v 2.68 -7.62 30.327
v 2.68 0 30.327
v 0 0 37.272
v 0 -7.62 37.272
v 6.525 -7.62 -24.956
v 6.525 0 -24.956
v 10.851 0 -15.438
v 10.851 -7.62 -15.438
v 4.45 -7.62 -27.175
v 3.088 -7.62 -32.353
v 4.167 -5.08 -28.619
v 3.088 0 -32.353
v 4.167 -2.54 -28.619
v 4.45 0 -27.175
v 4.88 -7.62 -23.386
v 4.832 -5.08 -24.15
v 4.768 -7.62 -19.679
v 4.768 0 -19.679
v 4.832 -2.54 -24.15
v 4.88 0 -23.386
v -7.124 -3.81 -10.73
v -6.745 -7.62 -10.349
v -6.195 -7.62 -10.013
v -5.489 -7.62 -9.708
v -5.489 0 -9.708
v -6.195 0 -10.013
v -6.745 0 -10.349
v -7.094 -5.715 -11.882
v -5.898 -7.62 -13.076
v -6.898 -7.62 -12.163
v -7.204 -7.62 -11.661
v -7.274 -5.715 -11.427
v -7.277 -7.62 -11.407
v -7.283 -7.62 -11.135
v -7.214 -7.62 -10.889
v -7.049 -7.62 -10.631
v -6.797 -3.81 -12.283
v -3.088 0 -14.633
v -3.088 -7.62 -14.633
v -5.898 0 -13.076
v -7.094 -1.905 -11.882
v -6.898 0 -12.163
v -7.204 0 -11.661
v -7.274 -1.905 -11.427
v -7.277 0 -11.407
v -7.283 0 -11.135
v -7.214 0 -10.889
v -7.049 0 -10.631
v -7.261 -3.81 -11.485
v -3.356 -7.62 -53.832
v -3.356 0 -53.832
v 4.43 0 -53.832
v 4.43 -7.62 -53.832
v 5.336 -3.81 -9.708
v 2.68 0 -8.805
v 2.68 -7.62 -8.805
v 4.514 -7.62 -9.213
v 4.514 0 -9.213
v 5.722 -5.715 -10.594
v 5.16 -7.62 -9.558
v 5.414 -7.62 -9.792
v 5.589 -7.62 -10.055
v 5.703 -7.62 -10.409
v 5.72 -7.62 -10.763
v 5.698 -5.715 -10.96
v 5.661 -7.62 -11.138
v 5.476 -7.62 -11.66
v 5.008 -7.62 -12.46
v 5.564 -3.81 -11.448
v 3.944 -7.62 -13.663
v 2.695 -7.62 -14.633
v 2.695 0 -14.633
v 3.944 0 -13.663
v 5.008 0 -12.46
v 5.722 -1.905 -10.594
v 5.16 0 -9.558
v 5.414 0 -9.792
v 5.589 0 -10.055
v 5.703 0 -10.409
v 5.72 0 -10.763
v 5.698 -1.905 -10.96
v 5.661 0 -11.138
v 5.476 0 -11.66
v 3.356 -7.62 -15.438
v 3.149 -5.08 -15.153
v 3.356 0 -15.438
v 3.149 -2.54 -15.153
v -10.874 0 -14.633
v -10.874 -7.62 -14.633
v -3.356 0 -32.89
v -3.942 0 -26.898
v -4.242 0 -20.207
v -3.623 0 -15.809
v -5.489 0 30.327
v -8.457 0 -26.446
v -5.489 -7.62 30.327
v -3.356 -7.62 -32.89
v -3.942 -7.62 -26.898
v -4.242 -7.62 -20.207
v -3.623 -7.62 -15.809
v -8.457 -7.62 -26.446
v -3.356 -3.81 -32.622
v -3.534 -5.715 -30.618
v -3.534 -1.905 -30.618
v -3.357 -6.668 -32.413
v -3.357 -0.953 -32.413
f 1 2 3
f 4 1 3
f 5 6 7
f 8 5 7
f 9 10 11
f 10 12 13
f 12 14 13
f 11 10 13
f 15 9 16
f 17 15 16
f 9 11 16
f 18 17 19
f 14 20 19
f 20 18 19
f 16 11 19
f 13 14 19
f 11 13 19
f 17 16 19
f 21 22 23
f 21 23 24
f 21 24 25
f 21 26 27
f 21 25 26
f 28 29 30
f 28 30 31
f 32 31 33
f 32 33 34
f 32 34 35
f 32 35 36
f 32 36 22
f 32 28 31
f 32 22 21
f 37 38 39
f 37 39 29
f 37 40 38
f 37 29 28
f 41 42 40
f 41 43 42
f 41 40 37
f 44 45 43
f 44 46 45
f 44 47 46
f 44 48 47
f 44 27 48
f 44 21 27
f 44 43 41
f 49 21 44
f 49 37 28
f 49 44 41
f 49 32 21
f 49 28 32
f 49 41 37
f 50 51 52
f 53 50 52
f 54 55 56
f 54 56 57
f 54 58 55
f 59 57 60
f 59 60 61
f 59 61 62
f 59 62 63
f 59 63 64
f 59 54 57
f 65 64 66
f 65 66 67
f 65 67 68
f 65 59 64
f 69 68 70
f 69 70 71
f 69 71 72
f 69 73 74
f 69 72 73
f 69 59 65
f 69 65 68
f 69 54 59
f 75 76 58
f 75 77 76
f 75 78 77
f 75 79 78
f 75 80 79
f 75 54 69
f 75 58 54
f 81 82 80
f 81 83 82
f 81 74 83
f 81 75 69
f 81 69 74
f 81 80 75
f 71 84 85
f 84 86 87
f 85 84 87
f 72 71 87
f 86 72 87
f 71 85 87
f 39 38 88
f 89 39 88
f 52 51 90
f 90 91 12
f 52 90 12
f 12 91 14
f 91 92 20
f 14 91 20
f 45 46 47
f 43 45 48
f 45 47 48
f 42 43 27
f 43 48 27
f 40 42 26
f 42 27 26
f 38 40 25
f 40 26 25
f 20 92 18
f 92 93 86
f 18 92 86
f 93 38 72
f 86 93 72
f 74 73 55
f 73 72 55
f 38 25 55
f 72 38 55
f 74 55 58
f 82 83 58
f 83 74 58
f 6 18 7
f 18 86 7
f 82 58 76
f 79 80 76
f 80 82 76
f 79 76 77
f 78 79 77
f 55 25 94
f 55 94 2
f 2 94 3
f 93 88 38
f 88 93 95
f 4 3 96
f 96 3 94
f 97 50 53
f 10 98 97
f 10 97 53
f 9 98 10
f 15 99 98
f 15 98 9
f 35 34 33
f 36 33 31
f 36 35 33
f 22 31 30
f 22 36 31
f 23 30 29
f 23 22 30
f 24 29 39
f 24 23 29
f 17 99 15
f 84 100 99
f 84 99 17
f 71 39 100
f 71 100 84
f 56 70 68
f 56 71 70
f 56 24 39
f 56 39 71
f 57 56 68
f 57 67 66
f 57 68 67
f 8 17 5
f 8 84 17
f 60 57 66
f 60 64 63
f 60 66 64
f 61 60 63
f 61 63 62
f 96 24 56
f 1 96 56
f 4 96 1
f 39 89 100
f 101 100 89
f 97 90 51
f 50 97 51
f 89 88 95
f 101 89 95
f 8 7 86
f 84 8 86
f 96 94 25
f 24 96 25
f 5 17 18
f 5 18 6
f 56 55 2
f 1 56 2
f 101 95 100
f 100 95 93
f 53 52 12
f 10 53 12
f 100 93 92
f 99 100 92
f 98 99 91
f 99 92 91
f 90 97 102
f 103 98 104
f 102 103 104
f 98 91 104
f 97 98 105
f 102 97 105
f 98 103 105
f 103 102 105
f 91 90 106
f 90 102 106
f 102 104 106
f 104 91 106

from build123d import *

# Parameters (mm, degrees)
F1_DEPTH = 7.62


with BuildPart() as f1:
    # F0 (on Front) → F1 (new body)
    with BuildSketch(Plane.XZ):
        with BuildLine():
            add(Edge.make_bspline(
                [(-3.6225296477, -15.809470365), (-5.221652466, -20.6566191195), (-3.0213163838, -32.7604657838), (-3.4122510352, -32.7973512532), (-3.3561242744, -32.8900180757)],
                knots=[0.0229994551, 0.0229994551, 0.0229994551, 0.0229994551, 0.2732662158, 0.3066490858, 0.3066490858, 0.3066490858, 0.3066490858], degree=3))
            add(Edge.make_bspline(
                [(-3.3561242744, -32.8900180757), (-3.1358457295, -33.2537039993), (0.4806107603, -36.7303956157), (2.2628287437, -34.532456504), (3.0876353849, -32.3530361056)],
                knots=[0.3066490858, 0.3066490858, 0.3066490858, 0.3066490858, 0.4376655552, 0.570837215, 0.570837215, 0.570837215, 0.570837215], degree=3))
            add(Edge.make_bspline(
                [(3.0876353849, -32.3530361056), (4.2694508133, -29.2302767542), (5.3002211715, -23.9077265842), (4.7680724157, -19.67944375)],
                knots=[0.570837215, 0.570837215, 0.570837215, 0.570837215, 0.7616508122, 0.7616508122, 0.7616508122, 0.7616508122], degree=3))
            Line((4.7680724157, -19.67944375), (3.3561252058, -15.4381711036))
            add(Edge.make_bspline(
                [(3.3561252058, -15.4381711036), (3.1559817041, -15.1441789227), (2.9338306018, -14.8749349929), (2.6951951163, -14.6327009425)],
                knots=[0.8358226137, 0.8358226137, 0.8358226137, 0.8358226137, 0.8553020379, 0.8553020379, 0.8553020379, 0.8553020379], degree=3))
            add(Edge.make_bspline(
                [(2.6951951163, -14.6327009425), (0.8124363798, -15.8162346158), (-0.8659672448, -15.5991068238), (-3.0876344535, -14.6327009425)],
                knots=[0.774708827, 0.774708827, 0.774708827, 0.774708827, 1, 1, 1, 1], degree=3))
            Line((-3.0876344535, -14.6327009425), (-3.6225296477, -15.809470365))
        make_face()
        with BuildLine():
            add(Edge.make_bspline(
                [(-3.3561242744, -32.8900180757), (-3.1358457295, -33.2537039993), (0.4806107603, -36.7303956157), (2.2628287437, -34.532456504), (3.0876353849, -32.3530361056)],
                knots=[0.3066490858, 0.3066490858, 0.3066490858, 0.3066490858, 0.4376655552, 0.570837215, 0.570837215, 0.570837215, 0.570837215], degree=3))
            Line((-3.3561242744, -32.8900180757), (-3.3561242744, -53.8322329521))
            Line((-3.3561242744, -53.8322329521), (4.4300844893, -53.8322329521))
            Line((4.4300844893, -53.8322329521), (3.0876353849, -32.3530361056))
        make_face()
        with BuildLine():
            Line((-8.4574334323, -26.4462586492), (-3.6225296477, -15.809470365))
            add(Edge.make_bspline(
                [(-3.0876344535, -14.6327009425), (-3.2987101155, -14.9678229002), (-3.4755706454, -15.3640185604), (-3.6225296477, -15.809470365)],
                knots=[0, 0, 0, 0, 0.0229994551, 0.0229994551, 0.0229994551, 0.0229994551], degree=3))
            Line((-3.0876344535, -14.6327009425), (-10.8738420531, -14.6327009425))
            Line((-10.8738420531, -14.6327009425), (-8.4574334323, -26.4462586492))
        make_face()
        with BuildLine():
            add(Edge.make_bspline(
                [(-3.0876344535, -14.6327009425), (-3.2987101155, -14.9678229002), (-3.4755706454, -15.3640185604), (-3.6225296477, -15.809470365)],
                knots=[0, 0, 0, 0, 0.0229994551, 0.0229994551, 0.0229994551, 0.0229994551], degree=3))
            Line((-3.6225296477, -15.809470365), (-3.0876344535, -14.6327009425))
        make_face()
        with BuildLine():
            Line((3.3561252058, -15.4381711036), (4.7680724157, -19.67944375))
            add(Edge.make_bspline(
                [(4.7680724157, -19.67944375), (4.5612190651, -18.0358535661), (4.1182115982, -16.5576051031), (3.3561252058, -15.4381711036)],
                knots=[0.7616508122, 0.7616508122, 0.7616508122, 0.7616508122, 0.8358226137, 0.8358226137, 0.8358226137, 0.8358226137], degree=3))
        make_face()
        with BuildLine():
            add(Edge.make_bspline(
                [(4.7680724157, -19.67944375), (4.5612190651, -18.0358535661), (4.1182115982, -16.5576051031), (3.3561252058, -15.4381711036)],
                knots=[0.7616508122, 0.7616508122, 0.7616508122, 0.7616508122, 0.8358226137, 0.8358226137, 0.8358226137, 0.8358226137], degree=3))
            Line((4.7680724157, -19.67944375), (6.5245554865, -24.9556492271))
            Line((6.5245554865, -24.9556492271), (10.8506819233, -15.4381711036))
            Line((10.8506819233, -15.4381711036), (3.3561252058, -15.4381711036))
        make_face()
        with BuildLine():
            add(Edge.make_bspline(
                [(-3.0876344535, -14.6327009425), (-5.2768470806, -13.6804125214), (-8.8119414144, -11.4945501592), (-6.2753688181, -10.0010317936), (-5.4893235481, -9.7083225846)],
                knots=[0, 0, 0, 0, 0.2220000722, 0.288874532, 0.288874532, 0.288874532, 0.288874532], degree=3))
            add(Edge.make_bspline(
                [(2.6951951163, -14.6327009425), (0.9225519342, -12.8333267335), (-1.7596804655, -12.5243264561), (-3.0876344535, -14.6327009425)],
                knots=[0.8553020379, 0.8553020379, 0.8553020379, 0.8553020379, 1, 1, 1, 1], degree=3))
            add(Edge.make_bspline(
                [(2.6801864152, -8.8047577827), (3.8798069065, -8.9398774496), (7.3812464459, -9.985272411), (4.5458992243, -13.4693173455), (2.6951951163, -14.6327009425)],
                knots=[0.4681393873, 0.4681393873, 0.4681393873, 0.4681393873, 0.5532533153, 0.774708827, 0.774708827, 0.774708827, 0.774708827], degree=3))
            add(Edge.make_bspline(
                [(-5.4893235481, -9.7083225846), (-3.3822367481, -8.9236811218), (0.1535753352, -8.5201720741), (2.6801864152, -8.8047577827)],
                knots=[0.288874532, 0.288874532, 0.288874532, 0.288874532, 0.4681393873, 0.4681393873, 0.4681393873, 0.4681393873], degree=3))
        make_face()
        with BuildLine():
            add(Edge.make_bspline(
                [(2.6951951163, -14.6327009425), (0.9225519342, -12.8333267335), (-1.7596804655, -12.5243264561), (-3.0876344535, -14.6327009425)],
                knots=[0.8553020379, 0.8553020379, 0.8553020379, 0.8553020379, 1, 1, 1, 1], degree=3))
            add(Edge.make_bspline(
                [(2.6951951163, -14.6327009425), (0.8124363798, -15.8162346158), (-0.8659672448, -15.5991068238), (-3.0876344535, -14.6327009425)],
                knots=[0.774708827, 0.774708827, 0.774708827, 0.774708827, 1, 1, 1, 1], degree=3))
        make_face()
        with BuildLine():
            Line((-5.4893235481, 30.3271058947), (-5.4893235481, -9.7083225846))
            add(Edge.make_bspline(
                [(-5.4893235481, -9.7083225846), (-3.3822367481, -8.9236811218), (0.1535753352, -8.5201720741), (2.6801864152, -8.8047577827)],
                knots=[0.288874532, 0.288874532, 0.288874532, 0.288874532, 0.4681393873, 0.4681393873, 0.4681393873, 0.4681393873], degree=3))
            Line((2.6801864152, -8.8047577827), (2.6801864152, 30.3271058947))
            Line((2.6801864152, 30.3271058947), (0, 37.272028625))
            Line((0, 37.272028625), (-5.4893235481, 30.3271058947))
        make_face()
    extrude(amount=F1_DEPTH)


solid = f1.part
